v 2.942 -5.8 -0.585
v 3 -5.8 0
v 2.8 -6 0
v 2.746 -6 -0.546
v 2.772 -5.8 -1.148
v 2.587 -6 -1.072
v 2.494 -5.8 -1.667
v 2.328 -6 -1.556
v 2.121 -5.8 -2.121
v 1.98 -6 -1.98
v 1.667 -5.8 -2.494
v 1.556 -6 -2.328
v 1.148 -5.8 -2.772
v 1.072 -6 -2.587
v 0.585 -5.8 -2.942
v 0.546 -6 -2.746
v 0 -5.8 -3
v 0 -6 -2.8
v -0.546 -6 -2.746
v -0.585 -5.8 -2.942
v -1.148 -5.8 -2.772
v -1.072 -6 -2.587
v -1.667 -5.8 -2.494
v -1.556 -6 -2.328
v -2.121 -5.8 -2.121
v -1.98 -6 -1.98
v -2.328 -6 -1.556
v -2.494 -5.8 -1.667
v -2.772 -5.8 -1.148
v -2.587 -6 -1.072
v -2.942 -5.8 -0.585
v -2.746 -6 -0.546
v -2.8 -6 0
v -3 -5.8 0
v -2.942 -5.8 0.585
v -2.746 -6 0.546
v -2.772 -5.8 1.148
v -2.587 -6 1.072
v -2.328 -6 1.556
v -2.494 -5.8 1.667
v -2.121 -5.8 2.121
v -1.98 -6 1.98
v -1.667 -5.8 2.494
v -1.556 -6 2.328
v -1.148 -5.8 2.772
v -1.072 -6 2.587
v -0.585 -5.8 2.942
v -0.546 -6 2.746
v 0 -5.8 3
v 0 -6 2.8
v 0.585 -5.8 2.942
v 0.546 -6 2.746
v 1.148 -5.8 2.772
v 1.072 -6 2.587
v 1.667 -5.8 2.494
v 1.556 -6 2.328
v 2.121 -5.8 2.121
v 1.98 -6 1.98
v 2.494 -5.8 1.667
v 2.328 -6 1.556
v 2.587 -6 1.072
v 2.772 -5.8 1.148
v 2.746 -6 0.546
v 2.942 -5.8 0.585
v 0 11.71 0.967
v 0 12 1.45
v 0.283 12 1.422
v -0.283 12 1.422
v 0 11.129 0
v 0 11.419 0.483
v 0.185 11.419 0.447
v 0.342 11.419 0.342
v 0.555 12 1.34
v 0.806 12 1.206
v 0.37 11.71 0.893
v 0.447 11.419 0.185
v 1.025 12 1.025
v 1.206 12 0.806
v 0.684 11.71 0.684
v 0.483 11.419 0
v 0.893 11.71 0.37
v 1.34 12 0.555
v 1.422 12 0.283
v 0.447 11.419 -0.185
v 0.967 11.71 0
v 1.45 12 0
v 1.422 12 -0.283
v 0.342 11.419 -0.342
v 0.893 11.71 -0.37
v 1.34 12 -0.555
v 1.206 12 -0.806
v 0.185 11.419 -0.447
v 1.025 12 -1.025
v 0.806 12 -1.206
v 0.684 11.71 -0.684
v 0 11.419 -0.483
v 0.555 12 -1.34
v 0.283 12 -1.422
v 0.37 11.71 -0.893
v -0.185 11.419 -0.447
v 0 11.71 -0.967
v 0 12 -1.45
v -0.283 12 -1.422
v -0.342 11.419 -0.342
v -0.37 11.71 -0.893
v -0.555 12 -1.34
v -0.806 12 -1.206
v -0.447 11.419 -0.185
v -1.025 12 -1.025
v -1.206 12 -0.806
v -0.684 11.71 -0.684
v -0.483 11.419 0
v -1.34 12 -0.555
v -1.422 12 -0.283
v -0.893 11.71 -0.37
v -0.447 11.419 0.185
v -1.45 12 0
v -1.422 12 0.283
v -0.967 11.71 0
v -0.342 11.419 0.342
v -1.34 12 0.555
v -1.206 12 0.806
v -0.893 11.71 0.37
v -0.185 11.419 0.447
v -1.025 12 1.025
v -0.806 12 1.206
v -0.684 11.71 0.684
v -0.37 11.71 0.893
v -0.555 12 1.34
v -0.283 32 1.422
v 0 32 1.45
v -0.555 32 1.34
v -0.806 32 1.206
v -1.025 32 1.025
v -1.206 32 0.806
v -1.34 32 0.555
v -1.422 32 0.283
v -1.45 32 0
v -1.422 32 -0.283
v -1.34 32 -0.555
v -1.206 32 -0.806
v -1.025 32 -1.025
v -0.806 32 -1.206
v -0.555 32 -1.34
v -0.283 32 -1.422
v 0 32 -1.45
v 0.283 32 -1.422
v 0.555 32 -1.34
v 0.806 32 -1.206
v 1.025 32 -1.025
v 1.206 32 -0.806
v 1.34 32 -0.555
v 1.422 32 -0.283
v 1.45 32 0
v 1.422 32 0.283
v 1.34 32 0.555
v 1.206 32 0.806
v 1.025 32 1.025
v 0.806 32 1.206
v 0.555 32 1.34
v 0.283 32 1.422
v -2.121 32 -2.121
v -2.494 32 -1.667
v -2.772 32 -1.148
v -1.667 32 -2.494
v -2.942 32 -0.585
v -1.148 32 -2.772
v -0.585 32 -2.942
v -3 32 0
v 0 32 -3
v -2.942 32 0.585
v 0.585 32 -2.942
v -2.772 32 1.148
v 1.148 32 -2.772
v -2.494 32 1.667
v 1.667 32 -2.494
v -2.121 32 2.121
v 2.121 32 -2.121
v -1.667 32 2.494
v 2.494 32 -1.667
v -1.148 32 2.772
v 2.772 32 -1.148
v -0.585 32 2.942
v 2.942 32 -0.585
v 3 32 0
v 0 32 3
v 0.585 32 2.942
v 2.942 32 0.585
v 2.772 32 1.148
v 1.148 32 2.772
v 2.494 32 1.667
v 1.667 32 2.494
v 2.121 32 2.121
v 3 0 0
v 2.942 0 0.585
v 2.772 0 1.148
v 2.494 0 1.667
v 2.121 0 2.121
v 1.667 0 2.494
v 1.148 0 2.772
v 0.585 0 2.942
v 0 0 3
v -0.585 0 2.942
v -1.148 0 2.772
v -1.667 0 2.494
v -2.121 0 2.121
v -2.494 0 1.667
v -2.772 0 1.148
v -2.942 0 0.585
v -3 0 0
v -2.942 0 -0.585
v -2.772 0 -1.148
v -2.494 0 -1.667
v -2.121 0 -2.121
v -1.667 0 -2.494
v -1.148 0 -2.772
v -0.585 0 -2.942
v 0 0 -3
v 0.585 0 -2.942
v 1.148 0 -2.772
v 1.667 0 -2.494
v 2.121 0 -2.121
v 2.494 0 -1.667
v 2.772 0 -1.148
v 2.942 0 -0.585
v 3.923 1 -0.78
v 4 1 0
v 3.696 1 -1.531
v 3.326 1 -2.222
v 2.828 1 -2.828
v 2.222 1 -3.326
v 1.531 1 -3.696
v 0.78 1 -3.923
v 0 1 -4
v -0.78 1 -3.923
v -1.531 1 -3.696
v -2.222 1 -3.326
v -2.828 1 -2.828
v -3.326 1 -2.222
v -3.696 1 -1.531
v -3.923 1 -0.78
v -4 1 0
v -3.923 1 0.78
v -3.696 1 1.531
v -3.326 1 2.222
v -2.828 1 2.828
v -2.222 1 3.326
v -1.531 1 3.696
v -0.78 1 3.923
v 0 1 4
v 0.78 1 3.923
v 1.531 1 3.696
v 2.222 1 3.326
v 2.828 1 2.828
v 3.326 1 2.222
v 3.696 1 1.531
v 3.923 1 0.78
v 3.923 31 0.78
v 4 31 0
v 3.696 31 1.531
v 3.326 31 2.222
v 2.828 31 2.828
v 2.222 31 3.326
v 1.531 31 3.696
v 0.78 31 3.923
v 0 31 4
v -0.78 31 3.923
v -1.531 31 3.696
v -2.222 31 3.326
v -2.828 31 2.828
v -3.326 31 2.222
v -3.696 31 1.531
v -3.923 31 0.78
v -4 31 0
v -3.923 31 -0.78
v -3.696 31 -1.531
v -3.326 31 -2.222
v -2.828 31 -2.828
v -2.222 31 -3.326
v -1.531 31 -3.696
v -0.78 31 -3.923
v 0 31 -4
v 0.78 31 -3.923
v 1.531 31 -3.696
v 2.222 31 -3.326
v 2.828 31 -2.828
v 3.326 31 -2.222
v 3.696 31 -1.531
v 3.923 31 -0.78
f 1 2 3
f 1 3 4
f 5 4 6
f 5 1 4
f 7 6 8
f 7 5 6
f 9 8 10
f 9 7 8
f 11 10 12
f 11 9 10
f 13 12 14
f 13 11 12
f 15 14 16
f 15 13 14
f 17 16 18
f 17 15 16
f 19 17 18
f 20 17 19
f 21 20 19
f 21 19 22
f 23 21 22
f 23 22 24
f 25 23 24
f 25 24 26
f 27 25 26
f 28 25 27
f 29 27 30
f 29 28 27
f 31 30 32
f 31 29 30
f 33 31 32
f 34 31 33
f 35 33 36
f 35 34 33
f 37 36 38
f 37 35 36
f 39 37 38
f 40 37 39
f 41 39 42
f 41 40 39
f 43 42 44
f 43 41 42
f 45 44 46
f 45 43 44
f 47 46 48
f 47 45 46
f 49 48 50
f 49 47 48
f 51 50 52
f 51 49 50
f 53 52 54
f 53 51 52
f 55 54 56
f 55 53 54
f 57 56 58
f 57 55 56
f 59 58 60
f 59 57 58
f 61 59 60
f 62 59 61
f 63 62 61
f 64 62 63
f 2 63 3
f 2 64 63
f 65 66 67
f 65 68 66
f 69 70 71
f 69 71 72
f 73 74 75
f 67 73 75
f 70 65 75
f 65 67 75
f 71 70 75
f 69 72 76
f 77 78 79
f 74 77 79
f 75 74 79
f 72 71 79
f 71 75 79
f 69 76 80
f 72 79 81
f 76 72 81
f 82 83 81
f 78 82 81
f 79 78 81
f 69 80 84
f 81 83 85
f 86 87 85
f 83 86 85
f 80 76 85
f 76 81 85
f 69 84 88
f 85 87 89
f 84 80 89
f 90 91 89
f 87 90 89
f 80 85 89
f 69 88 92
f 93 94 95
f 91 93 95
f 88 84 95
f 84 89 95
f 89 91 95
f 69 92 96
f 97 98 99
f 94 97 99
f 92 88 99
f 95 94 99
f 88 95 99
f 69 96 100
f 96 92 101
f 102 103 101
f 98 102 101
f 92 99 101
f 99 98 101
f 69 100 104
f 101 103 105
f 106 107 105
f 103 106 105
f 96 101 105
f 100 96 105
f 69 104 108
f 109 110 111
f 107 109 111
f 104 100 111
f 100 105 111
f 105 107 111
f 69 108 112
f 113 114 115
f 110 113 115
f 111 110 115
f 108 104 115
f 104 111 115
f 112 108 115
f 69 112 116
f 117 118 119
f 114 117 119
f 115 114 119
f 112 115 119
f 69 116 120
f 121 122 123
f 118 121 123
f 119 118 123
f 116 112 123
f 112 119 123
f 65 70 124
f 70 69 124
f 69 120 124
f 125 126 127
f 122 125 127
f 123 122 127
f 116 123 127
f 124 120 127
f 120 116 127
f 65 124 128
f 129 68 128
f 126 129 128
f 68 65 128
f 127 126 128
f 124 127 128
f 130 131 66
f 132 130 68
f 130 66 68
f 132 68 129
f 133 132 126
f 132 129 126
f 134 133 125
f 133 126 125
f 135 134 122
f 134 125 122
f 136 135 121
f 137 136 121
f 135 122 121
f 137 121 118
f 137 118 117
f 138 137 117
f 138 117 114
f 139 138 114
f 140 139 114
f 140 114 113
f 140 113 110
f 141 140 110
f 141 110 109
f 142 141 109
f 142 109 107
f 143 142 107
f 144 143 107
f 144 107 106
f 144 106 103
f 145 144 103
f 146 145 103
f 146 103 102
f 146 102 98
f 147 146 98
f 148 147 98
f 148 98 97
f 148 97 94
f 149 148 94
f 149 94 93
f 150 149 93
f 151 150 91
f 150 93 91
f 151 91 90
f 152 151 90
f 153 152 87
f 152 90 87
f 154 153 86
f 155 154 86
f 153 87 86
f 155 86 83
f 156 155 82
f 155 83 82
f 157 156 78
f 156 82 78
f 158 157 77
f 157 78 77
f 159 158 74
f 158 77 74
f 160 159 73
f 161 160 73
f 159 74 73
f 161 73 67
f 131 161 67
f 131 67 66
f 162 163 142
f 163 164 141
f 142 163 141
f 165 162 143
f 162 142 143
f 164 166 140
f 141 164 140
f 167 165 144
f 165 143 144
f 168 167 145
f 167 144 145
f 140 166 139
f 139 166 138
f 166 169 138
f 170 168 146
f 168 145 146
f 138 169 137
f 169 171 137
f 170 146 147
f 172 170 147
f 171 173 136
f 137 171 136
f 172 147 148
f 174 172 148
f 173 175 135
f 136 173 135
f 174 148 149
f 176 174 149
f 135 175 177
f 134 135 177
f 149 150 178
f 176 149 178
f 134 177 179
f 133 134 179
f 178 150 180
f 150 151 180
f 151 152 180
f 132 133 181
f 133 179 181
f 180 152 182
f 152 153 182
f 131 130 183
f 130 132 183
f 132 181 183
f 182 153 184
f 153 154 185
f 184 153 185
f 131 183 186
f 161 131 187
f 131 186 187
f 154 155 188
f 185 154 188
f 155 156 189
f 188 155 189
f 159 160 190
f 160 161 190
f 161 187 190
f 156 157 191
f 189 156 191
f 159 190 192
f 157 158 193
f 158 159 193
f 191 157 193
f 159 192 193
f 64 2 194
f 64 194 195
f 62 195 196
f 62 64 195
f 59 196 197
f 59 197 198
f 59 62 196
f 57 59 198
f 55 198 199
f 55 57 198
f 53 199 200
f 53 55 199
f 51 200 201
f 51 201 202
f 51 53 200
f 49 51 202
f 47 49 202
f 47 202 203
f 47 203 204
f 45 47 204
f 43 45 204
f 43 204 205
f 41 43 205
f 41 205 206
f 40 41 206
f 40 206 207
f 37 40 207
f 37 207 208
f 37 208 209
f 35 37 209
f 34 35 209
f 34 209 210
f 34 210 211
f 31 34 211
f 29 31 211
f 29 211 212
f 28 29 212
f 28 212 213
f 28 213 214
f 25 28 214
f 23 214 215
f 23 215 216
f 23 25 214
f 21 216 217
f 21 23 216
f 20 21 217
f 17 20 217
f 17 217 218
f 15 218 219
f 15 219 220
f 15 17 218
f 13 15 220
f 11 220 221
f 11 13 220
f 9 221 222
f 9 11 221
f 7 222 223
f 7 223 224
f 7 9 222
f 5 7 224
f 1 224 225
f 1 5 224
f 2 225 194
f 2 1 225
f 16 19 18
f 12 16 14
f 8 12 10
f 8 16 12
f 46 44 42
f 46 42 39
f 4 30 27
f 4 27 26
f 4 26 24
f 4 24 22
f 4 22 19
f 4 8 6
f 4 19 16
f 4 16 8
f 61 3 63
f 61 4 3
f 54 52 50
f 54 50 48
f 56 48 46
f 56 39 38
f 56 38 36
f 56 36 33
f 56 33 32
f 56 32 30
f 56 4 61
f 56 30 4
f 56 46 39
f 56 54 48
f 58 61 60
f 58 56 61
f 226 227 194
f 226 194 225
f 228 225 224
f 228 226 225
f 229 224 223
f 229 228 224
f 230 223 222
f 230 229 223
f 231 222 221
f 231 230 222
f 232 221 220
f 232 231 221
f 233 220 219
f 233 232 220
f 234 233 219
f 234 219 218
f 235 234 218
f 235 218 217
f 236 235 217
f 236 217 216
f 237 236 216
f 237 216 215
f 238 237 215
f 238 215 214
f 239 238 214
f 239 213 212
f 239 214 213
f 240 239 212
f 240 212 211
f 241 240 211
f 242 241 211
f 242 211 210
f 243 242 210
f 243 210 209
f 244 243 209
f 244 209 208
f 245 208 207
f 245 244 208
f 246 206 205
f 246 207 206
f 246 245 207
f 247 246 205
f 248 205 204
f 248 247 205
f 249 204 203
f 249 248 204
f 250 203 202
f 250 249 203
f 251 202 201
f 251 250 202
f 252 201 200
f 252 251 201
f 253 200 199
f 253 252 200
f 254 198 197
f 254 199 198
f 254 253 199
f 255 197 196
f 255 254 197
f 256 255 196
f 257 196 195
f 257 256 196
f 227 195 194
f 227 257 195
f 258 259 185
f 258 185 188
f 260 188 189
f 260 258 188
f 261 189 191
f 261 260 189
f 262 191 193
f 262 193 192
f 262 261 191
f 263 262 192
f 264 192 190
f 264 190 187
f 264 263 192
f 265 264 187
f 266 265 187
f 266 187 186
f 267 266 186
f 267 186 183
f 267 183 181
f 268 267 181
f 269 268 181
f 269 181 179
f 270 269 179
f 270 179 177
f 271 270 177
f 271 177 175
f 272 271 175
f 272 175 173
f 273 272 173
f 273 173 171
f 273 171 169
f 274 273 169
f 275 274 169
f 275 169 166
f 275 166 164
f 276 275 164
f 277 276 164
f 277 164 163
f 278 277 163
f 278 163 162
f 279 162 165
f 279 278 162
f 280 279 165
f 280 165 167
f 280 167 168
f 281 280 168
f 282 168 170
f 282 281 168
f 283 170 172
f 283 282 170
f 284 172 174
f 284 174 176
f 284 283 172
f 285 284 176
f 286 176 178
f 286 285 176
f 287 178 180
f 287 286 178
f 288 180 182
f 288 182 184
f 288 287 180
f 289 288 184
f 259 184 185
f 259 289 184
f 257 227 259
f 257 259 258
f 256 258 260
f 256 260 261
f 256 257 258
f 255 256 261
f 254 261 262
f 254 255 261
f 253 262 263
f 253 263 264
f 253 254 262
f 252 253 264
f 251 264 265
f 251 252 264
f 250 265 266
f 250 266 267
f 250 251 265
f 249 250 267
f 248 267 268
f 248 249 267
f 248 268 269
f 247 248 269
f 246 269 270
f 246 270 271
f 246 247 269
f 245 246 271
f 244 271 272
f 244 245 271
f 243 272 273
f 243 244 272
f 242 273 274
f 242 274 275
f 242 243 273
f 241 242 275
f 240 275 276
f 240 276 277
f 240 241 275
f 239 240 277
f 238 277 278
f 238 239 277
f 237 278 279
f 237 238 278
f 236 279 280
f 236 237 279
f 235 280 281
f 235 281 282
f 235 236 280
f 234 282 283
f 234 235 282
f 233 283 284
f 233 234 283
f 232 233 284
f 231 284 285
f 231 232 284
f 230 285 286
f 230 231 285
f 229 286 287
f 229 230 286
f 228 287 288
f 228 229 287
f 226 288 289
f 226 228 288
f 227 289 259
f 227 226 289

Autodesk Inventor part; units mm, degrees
sketch "Sketch_1" plane through (0, 0, 0) normal (0, 0, 1) x (1, 0, 0)
  line L0 (0, -38) -> (0, 38)
  line L1 (0, 32) -> (3, 32)
  line L2 (3, 32) -> (4, 31)
  line L3 (4, 31) -> (4, 1)
  line L4 (4, 1) -> (3, 0)
  line L5 (3, 0) -> (3, -5.8)
  line L6 (3, -5.8) -> (2.8, -6)
  line L7 (2.8, -6) -> (0, -6)
  line L8 (0, -6) -> (0, 32)
revolve "Revolution1" add sketch "Sketch_1" angle 360 about axis through (0, -38, 0) along (0, -1, 0)
thread "Thread1" size "M8x1" class "6g" standard "ISO Metric profile" full length
sketch "Sketch2" plane through (0, 32, 0) normal (0, 1, 0) x (1, 0, 0)
  point P0 (0, 0)
hole "Hole1" at (0, 32, 0) direction (0, -1, 0) diameter 2.9 depth 20 tip angle 118
ref_plane "to_cap_XY" through (0, 38, 0) normal (0, -1, 0) x (1, 0, 0)
ref_plane "to_cap_YZ" through (0, 38, 0) normal (1, 0, 0) x (0, 0, 1)
ref_plane "to_cap_ZX" through (0, 38, 0) normal (0, 0, 1) x (0, -1, 0)
ref_plane "to_nut1_XY" through (0, 7, 0) normal (0, -1, 0) x (1, 0, 0)
ref_plane "to_nut1_YZ" through (0, 7, 0) normal (1, 0, 0) x (0, 0, 1)
ref_plane "to_nut1_ZX" through (0, 7, 0) normal (0, 0, 1) x (0, -1, 0)
ref_plane "to_nut2_XY" through (0, 23, 0) normal (0, -1, 0) x (1, 0, 0)
ref_plane "to_nut2_YZ" through (0, 23, 0) normal (1, 0, 0) x (0, 0, 1)
ref_plane "to_nut2_ZX" through (0, 23, 0) normal (0, 0, 1) x (0, -1, 0)
ref_plane "to_rod_XY" through (0, 32, 0) normal (0, 1, 0) x (1, 0, 0)
ref_plane "to_rod_YZ" through (0, 32, 0) normal (1, 0, 0) x (0, 0, -1)
ref_plane "to_rod_ZX" through (0, 32, 0) normal (0, 0, -1) x (0, 1, 0)
ref_plane "to_washers_1_XY" through (0, 15, 0) normal (0, 1, 0) x (1, 0, 0)
ref_plane "to_washers_1_YZ" through (0, 15, 0) normal (1, 0, 0) x (0, 0, -1)
ref_plane "to_washers_1_ZX" through (0, 15, 0) normal (0, 0, -1) x (0, 1, 0)
ref_plane "to_washers_2_XY" through (0, 17, 0) normal (0, -1, 0) x (1, 0, 0)
ref_plane "to_washers_2_YZ" through (0, 17, 0) normal (1, 0, 0) x (0, 0, 1)
ref_plane "to_washers_2_ZX" through (0, 17, 0) normal (0, 0, 1) x (0, -1, 0)
properties part number "C-AC0806M_b"
